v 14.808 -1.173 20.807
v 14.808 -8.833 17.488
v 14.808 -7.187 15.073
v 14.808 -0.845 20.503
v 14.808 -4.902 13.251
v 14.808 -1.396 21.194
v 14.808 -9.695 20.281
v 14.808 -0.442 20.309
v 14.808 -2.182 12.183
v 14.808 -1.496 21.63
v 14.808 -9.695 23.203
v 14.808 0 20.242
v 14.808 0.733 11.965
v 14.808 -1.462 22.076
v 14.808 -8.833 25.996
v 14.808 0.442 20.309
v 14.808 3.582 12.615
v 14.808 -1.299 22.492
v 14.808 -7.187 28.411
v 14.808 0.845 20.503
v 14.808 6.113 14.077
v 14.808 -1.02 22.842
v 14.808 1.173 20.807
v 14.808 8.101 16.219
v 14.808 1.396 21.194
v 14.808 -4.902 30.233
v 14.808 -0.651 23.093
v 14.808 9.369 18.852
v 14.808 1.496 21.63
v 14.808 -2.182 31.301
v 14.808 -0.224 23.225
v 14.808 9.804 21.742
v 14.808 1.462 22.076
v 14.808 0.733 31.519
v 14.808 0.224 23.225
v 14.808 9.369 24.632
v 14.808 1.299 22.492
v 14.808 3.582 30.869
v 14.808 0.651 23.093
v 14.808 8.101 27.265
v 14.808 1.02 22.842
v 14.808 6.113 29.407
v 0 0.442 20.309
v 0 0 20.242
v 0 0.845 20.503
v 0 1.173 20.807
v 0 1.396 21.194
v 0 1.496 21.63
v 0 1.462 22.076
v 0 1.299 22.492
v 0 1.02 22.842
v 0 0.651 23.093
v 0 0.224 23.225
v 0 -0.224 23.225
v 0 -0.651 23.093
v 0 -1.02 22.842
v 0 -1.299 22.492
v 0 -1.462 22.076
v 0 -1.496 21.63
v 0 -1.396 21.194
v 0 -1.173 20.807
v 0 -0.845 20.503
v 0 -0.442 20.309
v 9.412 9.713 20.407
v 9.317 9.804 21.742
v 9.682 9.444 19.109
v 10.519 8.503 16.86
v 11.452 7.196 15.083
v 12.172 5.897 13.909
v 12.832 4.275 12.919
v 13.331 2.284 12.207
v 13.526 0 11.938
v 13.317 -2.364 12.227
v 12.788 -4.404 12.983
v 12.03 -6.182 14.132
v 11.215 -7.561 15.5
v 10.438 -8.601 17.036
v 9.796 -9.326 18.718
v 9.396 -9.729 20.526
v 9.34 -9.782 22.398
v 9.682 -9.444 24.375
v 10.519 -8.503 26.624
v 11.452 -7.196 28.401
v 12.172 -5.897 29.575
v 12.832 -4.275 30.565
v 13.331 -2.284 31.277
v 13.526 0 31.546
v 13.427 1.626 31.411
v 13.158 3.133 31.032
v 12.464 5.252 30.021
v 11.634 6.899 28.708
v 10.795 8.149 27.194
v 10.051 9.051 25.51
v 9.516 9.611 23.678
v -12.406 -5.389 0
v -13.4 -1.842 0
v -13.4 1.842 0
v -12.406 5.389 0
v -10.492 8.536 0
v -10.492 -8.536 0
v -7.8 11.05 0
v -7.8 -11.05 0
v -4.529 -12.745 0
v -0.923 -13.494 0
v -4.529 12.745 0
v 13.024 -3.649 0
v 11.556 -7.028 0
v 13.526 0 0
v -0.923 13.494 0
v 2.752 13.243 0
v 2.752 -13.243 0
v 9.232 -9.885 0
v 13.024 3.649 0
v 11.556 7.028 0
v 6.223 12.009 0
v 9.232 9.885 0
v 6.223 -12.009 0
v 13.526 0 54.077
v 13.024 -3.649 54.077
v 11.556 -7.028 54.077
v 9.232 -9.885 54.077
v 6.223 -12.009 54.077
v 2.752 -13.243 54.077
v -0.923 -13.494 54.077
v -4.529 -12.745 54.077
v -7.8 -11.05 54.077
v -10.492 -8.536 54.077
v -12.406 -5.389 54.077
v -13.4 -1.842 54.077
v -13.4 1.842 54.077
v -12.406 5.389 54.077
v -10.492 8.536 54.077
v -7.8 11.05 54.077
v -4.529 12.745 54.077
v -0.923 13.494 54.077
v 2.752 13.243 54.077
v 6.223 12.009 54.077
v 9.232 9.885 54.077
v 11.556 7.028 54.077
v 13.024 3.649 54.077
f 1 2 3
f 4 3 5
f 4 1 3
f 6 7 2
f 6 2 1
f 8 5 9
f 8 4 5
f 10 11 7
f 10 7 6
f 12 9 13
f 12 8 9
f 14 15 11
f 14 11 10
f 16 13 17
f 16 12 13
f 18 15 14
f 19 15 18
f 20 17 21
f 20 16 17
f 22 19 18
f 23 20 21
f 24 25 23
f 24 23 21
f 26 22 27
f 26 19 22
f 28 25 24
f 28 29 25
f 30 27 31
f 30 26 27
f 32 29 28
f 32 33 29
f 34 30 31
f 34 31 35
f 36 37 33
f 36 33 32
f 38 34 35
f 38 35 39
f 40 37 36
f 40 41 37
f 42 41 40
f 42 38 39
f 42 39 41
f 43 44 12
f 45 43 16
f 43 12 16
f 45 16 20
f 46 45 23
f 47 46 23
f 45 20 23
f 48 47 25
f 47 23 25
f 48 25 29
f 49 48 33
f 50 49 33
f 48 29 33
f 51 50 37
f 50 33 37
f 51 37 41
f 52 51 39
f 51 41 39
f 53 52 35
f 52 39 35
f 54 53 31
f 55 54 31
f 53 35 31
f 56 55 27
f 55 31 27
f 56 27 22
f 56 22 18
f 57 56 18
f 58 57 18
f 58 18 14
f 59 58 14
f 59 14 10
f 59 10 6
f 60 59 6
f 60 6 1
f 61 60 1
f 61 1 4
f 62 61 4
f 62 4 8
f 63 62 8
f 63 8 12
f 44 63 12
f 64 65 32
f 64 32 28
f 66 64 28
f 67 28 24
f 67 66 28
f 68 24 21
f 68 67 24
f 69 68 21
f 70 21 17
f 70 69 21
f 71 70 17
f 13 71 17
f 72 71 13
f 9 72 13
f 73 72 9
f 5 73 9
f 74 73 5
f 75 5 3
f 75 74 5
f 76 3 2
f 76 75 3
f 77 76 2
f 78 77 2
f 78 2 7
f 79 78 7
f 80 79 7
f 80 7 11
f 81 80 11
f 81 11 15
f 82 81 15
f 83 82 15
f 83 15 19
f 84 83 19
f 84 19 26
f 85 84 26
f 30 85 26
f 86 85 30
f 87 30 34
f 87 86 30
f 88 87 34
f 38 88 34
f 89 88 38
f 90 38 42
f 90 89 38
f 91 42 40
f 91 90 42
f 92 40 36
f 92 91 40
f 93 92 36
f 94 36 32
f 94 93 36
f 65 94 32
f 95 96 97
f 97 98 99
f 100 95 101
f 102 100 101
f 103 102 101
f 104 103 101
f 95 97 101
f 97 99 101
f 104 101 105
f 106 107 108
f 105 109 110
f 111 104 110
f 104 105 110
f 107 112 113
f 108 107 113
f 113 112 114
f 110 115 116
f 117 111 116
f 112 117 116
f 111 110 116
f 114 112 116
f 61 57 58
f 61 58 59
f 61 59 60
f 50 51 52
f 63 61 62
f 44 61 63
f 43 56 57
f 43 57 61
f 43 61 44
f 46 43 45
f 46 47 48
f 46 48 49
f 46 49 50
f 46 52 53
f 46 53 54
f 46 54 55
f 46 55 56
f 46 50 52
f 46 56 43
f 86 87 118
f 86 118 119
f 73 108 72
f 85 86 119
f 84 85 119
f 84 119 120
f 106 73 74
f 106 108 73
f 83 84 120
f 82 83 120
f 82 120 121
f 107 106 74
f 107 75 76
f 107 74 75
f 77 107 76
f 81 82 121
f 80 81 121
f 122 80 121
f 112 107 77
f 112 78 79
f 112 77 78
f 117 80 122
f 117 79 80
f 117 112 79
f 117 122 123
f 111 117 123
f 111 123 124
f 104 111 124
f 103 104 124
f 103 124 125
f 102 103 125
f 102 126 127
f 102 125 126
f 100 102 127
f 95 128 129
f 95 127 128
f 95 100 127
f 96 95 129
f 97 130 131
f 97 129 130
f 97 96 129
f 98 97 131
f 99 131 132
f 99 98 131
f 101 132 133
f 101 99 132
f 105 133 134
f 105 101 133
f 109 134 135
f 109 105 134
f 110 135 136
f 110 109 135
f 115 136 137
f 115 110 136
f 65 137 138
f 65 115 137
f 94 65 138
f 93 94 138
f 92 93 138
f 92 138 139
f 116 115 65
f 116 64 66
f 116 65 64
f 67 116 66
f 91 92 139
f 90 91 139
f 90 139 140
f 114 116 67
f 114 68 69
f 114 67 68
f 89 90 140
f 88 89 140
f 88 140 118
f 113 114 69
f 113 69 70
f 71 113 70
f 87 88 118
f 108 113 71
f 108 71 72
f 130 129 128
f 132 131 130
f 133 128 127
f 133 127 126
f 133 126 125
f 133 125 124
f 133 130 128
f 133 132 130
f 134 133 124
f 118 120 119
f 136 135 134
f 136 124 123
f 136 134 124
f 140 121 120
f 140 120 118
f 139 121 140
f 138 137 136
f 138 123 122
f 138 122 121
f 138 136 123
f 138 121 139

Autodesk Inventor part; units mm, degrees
ref_plane "YZ Plane" through (0, 0, 0) normal (1, 0, 0) x (0, 1, 0)
ref_plane "XZ Plane" through (0, 0, 0) normal (0, 1, 0) x (-1, 0, 0)
ref_plane "XY Plane" through (0, 0, 0) normal (0, 0, 1) x (1, 0, 0)
sketch "Sketch1" plane through (0, 0, 0) normal (0, 0, 1) x (1, 0, 0)
  circle A0 centre (0, 0) radius 13.5255
  dimension "d0" = 27.051
extrude "Extrusion1" add sketch "Sketch1" along normal blind 54.0766
sketch "Sketch2" plane through (0, 0, 0) normal (1, 0, 0) x (0, 1, 0)
  circle A0 centre (0, 21.742) radius 9.8044
  point P0 (0, 0)
  dimension "d3" = 19.6088
extrude "Extrusion2" add sketch "Sketch2" along normal blind 14.8082
sketch "Sketch3" plane through (14.8082, 0, 21.742) normal (1, 0, 0) x (0, 0, -1)
  circle A0 centre (0, 0) radius 1.5
  point P0 (21.742, 0)
  dimension "d6" = 3
extrude "Extrusion3" cut sketch "Sketch3" against normal blind 14.8082
properties part number "Camera"
